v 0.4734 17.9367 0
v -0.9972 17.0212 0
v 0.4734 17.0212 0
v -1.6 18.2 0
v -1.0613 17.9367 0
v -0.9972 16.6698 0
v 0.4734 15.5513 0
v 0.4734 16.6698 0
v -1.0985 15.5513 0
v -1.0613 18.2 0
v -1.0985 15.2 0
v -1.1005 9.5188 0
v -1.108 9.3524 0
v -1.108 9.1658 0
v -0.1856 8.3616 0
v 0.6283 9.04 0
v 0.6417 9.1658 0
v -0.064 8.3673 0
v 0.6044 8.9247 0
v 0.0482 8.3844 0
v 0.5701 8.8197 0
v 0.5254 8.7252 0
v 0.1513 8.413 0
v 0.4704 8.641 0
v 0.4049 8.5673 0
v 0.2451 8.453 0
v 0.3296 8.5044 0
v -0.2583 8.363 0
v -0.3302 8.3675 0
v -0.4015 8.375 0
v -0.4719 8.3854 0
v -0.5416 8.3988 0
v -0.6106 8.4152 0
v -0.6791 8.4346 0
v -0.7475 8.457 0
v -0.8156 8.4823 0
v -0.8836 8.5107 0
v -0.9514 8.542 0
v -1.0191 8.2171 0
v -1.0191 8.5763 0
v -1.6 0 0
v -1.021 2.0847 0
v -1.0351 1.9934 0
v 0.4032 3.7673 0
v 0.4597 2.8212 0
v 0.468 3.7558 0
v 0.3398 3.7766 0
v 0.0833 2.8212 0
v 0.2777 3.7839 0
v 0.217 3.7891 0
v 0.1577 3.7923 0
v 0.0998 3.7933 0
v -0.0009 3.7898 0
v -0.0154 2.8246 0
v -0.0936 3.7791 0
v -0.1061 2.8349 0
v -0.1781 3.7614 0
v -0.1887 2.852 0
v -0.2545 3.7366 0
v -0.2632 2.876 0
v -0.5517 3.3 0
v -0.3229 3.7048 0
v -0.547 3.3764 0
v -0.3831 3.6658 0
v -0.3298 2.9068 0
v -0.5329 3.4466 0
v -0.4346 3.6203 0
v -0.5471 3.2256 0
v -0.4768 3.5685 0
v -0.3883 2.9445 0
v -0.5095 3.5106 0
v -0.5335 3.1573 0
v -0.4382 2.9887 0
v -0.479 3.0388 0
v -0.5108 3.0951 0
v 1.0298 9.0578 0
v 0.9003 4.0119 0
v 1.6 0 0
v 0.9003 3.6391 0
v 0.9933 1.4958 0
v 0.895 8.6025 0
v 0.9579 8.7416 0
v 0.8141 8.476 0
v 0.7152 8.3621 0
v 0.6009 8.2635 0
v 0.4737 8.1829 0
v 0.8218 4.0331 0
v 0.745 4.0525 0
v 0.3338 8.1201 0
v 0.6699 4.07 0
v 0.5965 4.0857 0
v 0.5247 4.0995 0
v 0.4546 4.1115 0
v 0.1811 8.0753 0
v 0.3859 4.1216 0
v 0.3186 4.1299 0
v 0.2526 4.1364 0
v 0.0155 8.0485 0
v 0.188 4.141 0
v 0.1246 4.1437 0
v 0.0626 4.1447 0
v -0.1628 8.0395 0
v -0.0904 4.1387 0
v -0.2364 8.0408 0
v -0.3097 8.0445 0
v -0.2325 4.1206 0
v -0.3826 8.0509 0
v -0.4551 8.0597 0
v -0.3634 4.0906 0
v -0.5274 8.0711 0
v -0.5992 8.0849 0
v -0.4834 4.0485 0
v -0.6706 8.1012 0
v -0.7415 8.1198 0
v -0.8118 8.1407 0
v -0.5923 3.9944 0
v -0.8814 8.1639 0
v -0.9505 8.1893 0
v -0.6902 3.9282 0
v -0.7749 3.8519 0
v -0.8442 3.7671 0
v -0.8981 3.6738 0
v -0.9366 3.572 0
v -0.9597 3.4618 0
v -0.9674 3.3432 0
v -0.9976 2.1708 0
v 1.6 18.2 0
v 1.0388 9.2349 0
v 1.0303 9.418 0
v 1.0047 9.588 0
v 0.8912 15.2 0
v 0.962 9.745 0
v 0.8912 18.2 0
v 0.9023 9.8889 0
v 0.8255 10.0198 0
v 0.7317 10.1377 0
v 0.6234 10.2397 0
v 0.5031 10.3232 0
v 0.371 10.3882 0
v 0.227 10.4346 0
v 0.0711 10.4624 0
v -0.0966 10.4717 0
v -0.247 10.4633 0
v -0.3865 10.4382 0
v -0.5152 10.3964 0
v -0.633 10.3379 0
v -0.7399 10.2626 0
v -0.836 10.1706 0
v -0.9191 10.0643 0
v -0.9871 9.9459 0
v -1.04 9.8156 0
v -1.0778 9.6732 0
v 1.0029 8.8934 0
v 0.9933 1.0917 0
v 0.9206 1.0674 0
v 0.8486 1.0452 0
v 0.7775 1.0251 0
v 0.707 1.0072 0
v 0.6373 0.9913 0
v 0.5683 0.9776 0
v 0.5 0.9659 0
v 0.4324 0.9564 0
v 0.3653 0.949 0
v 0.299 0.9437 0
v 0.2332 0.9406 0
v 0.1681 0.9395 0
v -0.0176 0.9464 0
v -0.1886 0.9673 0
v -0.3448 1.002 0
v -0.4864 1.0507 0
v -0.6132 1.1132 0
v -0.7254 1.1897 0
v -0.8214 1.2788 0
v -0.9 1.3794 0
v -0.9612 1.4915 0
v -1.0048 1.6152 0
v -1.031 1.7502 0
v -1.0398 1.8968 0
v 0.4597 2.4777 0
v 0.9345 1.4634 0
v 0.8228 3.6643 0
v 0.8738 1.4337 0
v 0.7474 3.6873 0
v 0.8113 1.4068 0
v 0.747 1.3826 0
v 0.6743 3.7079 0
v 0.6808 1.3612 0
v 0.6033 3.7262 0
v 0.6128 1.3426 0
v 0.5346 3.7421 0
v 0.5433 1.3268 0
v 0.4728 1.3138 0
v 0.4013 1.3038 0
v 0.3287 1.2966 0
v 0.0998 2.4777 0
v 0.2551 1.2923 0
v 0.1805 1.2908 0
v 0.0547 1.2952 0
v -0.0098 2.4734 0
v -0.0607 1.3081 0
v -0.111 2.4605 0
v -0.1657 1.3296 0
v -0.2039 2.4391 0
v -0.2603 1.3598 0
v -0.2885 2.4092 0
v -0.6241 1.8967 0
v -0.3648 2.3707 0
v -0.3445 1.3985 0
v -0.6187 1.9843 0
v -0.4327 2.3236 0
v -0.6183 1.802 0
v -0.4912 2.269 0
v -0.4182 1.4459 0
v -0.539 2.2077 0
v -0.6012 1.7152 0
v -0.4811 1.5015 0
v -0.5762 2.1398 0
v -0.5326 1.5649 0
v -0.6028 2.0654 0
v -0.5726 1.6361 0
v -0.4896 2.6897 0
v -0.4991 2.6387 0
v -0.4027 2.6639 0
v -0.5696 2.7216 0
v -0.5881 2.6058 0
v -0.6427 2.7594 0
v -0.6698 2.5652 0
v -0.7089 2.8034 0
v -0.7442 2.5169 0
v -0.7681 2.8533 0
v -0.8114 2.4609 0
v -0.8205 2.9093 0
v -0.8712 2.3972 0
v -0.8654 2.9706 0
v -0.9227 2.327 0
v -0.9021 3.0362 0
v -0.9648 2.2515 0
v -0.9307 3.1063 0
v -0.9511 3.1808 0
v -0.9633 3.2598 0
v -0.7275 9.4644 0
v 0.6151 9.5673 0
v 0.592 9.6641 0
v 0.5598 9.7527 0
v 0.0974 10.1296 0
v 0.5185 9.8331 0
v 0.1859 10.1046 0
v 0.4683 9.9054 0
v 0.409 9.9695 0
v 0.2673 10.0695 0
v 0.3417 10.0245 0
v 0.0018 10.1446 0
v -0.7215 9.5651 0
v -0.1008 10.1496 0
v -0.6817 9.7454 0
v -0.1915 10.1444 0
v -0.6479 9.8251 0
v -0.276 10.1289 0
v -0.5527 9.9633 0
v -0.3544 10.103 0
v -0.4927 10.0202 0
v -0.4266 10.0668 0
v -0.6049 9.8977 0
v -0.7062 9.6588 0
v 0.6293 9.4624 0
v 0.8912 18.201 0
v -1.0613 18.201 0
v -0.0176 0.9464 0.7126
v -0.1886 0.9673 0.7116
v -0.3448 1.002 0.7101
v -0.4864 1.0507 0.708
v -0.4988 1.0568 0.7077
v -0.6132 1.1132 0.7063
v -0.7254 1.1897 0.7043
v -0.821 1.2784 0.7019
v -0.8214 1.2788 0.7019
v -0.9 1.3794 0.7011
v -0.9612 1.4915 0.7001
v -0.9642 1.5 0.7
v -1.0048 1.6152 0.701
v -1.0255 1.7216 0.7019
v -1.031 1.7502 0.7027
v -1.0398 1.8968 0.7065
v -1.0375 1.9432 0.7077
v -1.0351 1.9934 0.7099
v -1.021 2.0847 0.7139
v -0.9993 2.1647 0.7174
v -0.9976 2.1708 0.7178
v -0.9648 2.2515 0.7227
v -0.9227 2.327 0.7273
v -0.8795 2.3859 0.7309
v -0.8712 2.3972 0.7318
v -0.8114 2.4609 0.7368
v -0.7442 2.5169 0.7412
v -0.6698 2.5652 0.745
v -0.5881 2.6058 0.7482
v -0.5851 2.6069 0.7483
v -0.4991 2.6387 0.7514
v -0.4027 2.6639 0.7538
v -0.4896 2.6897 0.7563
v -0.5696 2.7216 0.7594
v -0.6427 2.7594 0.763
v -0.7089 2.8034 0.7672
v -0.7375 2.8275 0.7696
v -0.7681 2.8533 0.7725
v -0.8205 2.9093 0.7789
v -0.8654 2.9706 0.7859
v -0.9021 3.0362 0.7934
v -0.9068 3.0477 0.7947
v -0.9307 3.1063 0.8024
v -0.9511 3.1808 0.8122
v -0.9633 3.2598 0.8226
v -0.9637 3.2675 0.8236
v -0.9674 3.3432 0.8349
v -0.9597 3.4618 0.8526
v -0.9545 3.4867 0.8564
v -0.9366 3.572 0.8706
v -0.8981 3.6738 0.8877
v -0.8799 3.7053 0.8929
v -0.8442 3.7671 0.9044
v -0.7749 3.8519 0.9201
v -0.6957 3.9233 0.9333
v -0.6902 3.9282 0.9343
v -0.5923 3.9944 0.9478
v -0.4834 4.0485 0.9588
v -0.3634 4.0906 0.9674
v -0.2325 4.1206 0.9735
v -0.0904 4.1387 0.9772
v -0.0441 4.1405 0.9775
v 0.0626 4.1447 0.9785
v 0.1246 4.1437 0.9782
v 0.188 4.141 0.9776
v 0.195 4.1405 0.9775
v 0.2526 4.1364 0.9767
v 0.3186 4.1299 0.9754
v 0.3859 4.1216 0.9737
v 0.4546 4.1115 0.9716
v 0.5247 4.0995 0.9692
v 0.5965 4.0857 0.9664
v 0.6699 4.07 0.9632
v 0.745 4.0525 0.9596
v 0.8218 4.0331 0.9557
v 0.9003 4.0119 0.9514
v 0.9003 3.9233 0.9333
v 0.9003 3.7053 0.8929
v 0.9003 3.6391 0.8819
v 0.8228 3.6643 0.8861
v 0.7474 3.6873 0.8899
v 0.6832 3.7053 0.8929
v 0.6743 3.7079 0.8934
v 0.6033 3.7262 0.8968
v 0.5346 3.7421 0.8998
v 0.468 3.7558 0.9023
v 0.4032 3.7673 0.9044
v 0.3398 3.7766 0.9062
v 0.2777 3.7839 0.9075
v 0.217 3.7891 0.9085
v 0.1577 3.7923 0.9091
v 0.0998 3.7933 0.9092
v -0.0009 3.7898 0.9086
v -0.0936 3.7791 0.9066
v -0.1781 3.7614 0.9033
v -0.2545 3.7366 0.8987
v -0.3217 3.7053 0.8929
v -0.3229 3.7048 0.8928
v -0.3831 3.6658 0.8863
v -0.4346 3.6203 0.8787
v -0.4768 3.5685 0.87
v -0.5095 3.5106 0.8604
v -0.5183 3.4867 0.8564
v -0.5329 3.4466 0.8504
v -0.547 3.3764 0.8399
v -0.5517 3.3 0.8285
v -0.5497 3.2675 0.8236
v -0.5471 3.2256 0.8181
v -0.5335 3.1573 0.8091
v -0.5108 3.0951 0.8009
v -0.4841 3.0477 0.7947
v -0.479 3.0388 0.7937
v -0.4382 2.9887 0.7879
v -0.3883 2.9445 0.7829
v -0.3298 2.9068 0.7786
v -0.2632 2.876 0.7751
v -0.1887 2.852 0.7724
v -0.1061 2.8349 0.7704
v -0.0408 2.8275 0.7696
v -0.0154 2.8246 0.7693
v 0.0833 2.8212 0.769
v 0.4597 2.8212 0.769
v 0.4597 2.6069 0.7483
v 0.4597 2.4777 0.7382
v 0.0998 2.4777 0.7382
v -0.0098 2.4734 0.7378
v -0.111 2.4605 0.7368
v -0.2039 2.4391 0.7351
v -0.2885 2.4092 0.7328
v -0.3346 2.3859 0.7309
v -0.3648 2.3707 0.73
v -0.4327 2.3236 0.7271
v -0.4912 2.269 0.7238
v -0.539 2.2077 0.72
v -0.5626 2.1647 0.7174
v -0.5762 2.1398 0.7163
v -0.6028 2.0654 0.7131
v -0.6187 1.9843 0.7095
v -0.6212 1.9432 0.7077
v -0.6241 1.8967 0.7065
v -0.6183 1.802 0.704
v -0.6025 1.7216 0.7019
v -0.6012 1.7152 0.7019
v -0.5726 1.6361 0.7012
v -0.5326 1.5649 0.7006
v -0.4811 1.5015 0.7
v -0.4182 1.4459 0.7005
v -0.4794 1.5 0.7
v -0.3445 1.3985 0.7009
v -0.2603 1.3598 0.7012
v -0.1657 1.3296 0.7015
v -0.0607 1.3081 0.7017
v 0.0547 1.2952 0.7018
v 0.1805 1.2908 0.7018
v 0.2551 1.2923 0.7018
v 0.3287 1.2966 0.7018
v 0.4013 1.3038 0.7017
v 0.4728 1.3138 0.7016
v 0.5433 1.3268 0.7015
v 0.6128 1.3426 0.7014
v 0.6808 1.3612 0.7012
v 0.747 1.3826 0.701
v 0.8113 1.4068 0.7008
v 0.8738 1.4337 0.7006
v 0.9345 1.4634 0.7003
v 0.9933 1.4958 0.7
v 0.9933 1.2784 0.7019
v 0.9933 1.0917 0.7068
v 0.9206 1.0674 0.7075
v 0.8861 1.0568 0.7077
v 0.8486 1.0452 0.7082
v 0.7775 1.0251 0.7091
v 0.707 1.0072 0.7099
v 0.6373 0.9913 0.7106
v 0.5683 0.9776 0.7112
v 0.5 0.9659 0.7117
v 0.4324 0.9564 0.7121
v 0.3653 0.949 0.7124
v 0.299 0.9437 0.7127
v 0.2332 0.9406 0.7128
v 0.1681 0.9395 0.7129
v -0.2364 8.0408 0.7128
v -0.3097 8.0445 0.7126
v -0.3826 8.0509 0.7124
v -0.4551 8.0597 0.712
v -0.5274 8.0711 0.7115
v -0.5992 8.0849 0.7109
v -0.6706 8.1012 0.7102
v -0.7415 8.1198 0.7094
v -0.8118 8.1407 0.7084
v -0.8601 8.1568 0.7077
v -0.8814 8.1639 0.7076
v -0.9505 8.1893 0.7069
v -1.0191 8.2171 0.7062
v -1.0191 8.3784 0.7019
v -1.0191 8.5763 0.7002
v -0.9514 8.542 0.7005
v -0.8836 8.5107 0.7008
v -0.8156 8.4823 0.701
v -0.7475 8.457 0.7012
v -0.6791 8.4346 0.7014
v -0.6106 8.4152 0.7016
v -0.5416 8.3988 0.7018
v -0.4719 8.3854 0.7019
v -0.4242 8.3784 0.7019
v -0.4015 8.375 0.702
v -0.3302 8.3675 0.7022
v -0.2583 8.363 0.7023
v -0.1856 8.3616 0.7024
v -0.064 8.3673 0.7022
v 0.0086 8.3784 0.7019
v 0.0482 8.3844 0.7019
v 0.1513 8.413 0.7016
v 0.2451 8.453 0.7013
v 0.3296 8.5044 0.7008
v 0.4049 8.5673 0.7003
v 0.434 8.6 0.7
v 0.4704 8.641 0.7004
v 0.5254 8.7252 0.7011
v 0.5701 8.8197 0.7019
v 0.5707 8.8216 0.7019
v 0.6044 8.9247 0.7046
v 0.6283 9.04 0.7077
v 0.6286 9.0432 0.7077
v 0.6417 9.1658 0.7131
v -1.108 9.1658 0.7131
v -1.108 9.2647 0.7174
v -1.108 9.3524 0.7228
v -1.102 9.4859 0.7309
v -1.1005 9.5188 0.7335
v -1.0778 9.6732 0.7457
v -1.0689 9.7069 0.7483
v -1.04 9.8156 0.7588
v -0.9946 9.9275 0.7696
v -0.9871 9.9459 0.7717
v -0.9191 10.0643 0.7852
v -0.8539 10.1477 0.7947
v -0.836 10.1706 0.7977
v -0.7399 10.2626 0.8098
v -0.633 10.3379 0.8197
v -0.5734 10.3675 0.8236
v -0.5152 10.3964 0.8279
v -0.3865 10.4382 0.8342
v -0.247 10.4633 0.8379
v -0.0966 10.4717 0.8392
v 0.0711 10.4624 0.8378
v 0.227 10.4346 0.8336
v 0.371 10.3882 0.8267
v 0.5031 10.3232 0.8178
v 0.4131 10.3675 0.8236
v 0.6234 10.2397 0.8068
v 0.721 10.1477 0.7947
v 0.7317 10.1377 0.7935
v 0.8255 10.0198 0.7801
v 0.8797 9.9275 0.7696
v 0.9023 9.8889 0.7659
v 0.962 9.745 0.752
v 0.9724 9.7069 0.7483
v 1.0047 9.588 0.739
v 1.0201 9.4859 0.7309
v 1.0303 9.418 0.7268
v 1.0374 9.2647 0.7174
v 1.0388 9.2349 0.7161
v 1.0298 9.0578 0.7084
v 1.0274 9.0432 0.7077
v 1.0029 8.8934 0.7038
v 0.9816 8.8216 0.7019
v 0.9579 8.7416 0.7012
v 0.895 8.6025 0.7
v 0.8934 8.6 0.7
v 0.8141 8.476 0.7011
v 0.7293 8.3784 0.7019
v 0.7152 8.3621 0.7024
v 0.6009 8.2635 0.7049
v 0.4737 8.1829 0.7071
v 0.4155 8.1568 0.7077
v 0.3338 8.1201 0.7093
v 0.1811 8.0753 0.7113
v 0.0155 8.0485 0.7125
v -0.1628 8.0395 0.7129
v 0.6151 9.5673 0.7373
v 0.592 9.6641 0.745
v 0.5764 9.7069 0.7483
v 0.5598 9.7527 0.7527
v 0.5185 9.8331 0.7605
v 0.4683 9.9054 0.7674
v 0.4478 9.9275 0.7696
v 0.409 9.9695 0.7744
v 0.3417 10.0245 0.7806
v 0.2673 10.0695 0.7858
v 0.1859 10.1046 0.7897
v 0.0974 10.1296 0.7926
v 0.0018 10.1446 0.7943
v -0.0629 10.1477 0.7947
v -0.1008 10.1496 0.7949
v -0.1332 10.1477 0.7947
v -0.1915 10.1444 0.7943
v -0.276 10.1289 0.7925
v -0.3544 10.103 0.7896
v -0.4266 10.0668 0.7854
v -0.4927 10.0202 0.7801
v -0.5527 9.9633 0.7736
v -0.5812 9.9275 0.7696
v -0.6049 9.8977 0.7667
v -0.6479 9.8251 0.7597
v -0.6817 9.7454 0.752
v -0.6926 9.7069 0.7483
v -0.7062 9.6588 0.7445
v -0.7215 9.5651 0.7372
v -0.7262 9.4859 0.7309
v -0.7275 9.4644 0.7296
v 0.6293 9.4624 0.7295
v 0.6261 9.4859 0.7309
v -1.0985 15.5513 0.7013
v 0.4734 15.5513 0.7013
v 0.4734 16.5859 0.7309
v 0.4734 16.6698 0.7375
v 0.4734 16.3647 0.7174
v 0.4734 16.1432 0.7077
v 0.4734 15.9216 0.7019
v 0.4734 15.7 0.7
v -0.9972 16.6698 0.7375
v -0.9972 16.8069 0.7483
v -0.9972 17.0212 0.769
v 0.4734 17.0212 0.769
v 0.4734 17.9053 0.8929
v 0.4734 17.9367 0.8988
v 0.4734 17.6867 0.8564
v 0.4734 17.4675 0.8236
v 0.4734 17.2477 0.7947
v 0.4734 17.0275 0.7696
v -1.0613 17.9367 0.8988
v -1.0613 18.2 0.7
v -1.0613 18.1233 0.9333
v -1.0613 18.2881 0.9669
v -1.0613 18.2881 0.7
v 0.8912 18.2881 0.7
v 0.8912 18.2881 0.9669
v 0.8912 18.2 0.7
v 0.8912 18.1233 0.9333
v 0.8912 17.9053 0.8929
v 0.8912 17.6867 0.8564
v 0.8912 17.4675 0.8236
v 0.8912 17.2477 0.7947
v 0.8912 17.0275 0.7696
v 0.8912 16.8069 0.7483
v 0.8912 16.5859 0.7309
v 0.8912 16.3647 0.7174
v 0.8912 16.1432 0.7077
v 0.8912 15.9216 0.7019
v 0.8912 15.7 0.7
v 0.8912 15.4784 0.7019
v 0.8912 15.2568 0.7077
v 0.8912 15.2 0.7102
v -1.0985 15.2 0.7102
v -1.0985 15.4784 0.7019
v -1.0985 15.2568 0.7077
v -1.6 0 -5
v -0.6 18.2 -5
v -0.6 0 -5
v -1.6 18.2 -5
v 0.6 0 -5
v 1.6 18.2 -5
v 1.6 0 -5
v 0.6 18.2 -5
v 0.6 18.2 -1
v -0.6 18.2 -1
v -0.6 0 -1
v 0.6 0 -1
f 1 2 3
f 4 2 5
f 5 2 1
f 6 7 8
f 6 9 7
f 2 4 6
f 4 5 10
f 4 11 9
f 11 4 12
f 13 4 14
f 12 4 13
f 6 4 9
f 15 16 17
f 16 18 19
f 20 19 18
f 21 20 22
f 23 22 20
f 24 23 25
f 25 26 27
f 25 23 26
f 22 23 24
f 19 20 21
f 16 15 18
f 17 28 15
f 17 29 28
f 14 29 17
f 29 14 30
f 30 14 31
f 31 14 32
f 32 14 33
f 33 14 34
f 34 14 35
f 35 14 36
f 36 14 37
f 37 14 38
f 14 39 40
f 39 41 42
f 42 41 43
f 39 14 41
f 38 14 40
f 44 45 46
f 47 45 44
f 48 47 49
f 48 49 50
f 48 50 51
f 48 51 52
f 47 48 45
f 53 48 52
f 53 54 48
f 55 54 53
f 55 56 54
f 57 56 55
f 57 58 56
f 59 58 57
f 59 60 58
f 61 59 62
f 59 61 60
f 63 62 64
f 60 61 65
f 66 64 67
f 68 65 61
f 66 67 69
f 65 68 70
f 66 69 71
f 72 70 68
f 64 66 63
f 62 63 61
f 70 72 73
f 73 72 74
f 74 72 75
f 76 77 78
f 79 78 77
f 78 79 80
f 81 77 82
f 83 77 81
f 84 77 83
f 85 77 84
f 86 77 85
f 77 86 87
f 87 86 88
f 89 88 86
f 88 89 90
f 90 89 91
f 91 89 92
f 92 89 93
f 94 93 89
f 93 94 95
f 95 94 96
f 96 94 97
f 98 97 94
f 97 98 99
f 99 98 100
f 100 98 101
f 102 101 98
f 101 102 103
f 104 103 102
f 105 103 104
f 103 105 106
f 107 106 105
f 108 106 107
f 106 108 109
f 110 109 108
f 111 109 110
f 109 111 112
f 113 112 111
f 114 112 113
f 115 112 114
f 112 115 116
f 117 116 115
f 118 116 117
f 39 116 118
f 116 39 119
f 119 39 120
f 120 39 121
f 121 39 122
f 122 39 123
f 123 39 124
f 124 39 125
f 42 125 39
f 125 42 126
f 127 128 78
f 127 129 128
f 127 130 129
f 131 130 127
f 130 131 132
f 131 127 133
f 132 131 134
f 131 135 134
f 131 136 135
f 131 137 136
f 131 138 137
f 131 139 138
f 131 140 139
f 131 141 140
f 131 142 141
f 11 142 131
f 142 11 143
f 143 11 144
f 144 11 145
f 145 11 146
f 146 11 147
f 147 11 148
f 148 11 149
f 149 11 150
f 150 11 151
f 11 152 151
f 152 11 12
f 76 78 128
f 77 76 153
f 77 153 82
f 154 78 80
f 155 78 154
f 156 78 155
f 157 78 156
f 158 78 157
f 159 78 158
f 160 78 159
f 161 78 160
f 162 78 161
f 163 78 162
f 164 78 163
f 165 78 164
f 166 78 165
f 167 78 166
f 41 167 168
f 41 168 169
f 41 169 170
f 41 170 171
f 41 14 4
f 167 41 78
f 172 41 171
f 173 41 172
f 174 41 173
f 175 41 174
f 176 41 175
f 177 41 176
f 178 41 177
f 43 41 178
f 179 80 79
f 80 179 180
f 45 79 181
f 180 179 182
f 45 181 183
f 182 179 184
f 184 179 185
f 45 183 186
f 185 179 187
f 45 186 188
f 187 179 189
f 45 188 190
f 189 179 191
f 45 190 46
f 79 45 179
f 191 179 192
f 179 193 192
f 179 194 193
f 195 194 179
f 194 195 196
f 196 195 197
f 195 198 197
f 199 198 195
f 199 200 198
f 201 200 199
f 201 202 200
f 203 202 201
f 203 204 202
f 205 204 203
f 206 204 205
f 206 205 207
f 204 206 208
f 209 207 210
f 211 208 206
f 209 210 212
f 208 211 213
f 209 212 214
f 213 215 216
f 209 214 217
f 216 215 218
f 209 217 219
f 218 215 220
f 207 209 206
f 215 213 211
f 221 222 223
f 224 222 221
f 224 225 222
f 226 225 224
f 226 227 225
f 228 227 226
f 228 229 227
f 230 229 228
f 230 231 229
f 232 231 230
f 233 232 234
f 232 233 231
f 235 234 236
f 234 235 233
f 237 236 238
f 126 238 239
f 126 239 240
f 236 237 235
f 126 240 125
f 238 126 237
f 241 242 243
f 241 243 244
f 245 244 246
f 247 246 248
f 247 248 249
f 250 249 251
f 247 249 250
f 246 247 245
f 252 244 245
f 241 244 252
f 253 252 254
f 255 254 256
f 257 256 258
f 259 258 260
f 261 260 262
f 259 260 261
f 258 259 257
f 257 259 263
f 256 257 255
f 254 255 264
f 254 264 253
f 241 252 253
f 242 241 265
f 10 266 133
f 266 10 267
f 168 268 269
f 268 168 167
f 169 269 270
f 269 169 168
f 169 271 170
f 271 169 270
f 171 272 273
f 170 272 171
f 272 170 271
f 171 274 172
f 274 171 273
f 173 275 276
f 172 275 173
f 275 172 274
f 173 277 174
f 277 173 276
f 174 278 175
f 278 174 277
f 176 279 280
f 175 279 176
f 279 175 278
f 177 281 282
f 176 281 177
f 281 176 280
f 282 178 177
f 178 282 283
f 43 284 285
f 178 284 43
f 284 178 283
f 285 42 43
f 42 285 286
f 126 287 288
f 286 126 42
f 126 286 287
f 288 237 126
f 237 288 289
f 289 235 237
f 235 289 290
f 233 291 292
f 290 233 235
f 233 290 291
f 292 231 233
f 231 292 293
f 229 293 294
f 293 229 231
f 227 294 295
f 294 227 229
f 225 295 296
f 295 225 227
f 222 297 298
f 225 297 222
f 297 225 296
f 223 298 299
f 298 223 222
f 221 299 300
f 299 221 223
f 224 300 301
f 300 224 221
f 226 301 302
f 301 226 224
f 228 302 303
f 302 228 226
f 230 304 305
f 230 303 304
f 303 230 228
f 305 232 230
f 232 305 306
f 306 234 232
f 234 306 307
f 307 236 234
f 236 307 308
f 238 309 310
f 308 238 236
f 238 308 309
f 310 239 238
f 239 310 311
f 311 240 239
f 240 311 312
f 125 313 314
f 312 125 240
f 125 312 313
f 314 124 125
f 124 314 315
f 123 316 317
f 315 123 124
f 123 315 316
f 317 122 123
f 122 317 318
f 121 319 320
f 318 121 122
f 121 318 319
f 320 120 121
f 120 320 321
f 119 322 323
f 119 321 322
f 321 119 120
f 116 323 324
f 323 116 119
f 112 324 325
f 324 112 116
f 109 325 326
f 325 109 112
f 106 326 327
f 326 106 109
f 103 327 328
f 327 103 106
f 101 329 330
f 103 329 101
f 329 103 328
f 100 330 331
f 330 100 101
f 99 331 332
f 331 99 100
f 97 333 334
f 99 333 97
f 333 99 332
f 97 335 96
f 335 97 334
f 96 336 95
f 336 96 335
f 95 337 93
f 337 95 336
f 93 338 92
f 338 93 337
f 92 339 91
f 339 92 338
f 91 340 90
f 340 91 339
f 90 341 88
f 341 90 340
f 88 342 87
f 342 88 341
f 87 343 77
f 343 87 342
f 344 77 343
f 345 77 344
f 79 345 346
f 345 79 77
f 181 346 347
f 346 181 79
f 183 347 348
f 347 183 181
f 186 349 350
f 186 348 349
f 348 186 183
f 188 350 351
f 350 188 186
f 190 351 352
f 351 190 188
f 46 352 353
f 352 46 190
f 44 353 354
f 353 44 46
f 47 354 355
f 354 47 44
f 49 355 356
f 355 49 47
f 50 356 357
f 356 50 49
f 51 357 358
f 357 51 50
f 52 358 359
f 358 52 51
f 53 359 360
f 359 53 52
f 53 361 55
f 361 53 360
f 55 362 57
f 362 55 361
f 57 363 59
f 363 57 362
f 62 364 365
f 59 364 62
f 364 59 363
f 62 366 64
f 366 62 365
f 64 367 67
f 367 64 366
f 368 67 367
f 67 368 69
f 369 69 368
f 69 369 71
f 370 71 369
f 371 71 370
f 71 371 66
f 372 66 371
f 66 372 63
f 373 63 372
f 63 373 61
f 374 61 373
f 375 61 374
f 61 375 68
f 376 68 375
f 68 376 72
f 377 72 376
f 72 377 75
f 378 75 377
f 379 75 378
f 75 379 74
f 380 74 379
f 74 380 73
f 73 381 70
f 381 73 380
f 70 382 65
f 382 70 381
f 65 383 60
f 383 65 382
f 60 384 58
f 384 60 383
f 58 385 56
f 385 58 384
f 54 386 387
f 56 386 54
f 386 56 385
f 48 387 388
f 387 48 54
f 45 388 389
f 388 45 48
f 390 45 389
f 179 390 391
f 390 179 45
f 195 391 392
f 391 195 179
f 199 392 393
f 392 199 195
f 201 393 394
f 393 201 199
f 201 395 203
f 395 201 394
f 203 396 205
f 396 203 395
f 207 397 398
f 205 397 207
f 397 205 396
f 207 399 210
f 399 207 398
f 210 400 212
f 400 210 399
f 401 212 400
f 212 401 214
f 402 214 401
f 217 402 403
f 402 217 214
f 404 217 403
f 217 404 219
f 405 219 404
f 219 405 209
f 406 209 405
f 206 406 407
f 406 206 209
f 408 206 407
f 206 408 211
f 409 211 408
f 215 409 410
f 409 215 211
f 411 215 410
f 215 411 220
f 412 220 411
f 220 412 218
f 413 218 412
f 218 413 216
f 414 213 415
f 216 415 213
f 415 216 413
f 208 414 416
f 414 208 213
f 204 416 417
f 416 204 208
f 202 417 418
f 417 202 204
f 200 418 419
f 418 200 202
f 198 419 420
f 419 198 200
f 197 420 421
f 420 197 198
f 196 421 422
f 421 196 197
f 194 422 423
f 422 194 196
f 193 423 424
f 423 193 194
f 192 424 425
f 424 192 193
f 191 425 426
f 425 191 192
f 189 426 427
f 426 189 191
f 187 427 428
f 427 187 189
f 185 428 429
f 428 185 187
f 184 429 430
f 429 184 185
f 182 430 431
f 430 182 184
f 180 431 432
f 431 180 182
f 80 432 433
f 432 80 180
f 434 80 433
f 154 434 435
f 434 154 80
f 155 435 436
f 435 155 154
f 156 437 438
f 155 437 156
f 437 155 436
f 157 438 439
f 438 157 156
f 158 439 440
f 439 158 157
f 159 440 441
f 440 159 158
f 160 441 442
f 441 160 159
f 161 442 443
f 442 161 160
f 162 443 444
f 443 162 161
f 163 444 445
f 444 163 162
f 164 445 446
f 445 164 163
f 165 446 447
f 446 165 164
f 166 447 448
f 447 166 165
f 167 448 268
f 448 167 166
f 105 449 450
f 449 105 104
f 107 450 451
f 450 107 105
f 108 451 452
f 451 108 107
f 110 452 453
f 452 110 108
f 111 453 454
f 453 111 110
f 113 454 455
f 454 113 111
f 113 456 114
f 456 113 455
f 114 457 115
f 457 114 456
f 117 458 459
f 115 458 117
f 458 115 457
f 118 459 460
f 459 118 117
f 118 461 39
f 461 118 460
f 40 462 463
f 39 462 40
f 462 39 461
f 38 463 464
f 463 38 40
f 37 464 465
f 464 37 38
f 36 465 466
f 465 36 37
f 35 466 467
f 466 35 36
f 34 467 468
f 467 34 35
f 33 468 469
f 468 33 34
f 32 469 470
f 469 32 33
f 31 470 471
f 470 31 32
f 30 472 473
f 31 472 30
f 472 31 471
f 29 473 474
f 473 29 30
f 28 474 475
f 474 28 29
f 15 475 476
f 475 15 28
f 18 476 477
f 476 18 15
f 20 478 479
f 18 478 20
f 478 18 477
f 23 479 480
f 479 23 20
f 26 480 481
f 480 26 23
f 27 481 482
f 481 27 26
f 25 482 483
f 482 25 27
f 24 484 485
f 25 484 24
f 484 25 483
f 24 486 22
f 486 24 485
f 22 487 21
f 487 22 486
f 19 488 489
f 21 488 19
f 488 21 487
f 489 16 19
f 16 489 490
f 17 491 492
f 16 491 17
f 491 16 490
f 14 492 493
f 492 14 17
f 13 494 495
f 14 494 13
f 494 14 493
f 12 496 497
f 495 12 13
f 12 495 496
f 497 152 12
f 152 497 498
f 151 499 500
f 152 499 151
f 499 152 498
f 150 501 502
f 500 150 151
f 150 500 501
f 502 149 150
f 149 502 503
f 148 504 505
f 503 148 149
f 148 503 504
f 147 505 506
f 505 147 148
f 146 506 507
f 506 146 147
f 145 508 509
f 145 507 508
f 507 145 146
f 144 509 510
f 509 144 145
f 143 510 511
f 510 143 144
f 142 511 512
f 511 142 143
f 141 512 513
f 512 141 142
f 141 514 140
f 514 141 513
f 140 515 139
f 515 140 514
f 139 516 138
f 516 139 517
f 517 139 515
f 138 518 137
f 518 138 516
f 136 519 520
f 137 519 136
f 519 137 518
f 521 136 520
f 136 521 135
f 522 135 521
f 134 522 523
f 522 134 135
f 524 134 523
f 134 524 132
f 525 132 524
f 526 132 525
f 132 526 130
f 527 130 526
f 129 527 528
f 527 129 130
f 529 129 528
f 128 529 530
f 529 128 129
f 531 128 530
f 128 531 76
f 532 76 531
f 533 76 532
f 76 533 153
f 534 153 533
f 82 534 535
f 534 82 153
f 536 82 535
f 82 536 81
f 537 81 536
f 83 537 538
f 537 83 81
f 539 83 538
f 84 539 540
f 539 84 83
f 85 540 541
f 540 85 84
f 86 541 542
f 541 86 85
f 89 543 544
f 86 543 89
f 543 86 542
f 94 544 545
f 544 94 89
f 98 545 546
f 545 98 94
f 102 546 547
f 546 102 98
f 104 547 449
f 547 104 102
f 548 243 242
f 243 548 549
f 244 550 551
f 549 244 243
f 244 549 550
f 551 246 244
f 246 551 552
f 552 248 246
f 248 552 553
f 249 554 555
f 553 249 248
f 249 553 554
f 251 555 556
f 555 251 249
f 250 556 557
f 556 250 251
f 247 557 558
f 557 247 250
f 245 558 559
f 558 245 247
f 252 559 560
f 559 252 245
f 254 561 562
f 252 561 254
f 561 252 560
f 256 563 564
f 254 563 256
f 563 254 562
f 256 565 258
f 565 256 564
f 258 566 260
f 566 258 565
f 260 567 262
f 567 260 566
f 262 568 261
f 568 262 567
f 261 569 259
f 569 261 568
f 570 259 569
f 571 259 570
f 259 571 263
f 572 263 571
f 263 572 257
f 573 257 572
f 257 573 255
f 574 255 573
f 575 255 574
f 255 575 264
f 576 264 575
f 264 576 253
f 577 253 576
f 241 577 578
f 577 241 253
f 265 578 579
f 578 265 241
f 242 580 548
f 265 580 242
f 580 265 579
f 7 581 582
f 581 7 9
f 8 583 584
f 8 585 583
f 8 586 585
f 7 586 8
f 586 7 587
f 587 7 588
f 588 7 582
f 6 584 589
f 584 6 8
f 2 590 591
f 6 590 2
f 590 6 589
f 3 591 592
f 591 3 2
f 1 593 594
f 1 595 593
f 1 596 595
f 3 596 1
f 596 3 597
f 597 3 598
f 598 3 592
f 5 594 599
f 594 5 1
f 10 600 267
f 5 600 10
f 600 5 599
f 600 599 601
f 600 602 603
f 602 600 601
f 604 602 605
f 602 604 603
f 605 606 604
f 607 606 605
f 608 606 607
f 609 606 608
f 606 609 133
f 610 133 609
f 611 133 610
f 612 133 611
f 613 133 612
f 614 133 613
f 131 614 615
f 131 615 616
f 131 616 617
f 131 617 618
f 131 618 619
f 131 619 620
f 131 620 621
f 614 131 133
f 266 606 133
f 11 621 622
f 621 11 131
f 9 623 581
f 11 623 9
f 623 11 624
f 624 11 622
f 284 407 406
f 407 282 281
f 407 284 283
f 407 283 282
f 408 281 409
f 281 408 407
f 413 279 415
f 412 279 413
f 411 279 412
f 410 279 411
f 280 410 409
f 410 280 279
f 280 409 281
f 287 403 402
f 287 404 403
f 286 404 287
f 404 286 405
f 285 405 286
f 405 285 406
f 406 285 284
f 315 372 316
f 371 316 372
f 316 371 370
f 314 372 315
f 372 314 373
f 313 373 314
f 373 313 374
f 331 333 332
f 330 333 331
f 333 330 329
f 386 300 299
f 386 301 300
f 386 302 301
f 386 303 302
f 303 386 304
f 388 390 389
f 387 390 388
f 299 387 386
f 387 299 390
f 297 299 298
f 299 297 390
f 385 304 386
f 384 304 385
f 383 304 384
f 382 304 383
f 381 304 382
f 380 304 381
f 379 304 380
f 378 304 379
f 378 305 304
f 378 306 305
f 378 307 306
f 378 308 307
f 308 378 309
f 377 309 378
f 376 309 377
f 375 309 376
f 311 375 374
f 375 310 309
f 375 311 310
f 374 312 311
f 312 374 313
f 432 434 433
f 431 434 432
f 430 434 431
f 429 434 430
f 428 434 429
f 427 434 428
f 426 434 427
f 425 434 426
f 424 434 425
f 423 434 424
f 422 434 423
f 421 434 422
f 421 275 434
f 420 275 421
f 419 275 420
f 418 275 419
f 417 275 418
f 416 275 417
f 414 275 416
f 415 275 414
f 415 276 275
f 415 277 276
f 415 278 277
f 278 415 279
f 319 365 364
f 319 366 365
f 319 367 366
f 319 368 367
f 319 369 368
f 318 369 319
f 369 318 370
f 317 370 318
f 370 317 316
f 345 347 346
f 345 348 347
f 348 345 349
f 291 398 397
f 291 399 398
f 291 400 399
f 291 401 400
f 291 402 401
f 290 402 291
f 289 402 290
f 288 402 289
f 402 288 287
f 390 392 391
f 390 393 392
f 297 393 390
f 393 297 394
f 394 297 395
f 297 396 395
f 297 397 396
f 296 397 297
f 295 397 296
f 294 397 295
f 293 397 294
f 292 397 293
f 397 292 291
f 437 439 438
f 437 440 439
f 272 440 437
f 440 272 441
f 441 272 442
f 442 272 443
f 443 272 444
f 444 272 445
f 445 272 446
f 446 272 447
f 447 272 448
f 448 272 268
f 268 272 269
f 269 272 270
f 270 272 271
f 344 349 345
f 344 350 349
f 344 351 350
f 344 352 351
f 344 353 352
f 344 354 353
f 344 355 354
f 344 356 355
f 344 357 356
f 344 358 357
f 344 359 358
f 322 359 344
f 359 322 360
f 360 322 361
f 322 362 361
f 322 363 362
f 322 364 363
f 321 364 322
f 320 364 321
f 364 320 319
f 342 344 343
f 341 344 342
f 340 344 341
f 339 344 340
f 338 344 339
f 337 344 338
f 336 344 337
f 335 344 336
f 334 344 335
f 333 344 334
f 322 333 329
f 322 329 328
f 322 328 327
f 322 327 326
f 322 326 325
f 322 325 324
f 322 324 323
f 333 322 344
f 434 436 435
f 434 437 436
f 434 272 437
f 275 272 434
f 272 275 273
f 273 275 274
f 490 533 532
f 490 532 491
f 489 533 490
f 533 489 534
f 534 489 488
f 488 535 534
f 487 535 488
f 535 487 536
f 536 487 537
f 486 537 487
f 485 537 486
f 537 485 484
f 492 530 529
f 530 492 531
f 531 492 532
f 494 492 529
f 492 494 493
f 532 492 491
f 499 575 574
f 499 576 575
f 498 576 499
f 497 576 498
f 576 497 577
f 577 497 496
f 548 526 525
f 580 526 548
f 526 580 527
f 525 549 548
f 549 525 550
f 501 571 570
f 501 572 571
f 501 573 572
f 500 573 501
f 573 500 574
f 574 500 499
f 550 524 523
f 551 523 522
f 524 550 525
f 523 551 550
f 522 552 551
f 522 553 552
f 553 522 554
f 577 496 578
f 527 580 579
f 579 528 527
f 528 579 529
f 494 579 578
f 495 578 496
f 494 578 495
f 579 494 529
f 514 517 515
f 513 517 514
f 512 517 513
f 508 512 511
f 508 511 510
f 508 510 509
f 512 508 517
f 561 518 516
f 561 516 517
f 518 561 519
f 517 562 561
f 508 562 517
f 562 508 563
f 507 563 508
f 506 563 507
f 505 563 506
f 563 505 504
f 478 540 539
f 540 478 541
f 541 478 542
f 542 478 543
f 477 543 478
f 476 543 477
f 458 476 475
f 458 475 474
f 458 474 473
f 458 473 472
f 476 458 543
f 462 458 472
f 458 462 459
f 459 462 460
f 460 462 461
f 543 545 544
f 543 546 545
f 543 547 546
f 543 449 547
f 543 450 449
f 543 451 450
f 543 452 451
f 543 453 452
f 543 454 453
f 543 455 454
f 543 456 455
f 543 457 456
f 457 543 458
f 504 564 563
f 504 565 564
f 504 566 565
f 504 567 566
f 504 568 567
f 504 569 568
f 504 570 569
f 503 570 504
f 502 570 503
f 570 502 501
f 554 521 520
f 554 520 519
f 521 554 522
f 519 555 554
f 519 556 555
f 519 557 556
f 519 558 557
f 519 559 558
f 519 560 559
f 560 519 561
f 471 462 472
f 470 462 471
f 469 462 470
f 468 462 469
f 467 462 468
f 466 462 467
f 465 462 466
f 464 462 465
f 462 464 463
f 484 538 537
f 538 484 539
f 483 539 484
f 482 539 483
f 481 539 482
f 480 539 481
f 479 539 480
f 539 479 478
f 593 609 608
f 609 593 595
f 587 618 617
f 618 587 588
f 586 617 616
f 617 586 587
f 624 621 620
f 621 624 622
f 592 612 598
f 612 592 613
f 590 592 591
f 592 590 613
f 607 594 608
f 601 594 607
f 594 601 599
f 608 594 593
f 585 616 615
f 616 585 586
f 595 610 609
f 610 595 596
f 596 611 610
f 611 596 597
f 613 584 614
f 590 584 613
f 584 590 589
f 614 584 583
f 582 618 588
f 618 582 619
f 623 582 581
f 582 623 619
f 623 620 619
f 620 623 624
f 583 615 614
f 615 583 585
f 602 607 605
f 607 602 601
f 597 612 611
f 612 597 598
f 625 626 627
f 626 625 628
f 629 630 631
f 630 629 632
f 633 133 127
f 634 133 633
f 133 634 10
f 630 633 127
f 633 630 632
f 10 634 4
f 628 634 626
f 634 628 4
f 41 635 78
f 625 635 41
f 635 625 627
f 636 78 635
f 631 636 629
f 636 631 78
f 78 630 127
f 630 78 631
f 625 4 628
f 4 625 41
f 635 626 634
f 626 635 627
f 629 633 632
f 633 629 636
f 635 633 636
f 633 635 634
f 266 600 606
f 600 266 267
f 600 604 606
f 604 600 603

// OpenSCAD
//Type Slug
//Leonard Chau
//October 5, 2023
$fn=40;
Body_Width=3.2;//B
Body_Length=18.2;//A
Body_Height=5;//C
Platen_Shift_Motion=7.1;//P
Baselines_Shift_Motion=7.1;//O
Body_Slot_Width=1.2;//D
Wing_Thickness=(Body_Width-Body_Slot_Width)/2; // .5;//G
Aligning_Cut=1.5;//Bottom of slug to lowercase cut
Baseline=1;//Bottom of slug to lowercase
Platen_Diameter=25.4;//R
Bottom_Thickness=1;//F
Draft_Angle=60;//alpha
r=sin(Draft_Angle);
Engraving_Depth=.7;//E
Upper_Wing_Angle=0;// 12;//gamma
Lower_Wing_Angle=0;// 10;//roh

Lower_Char="e";
Upper_Char="E";
Figure_Char="3";
Type_Size=3.05;
Typeface="Erica Type";
Debug_No_Minkowski=true;

difference(){
    union(){
//Create Solid Type Body
        translate([-Body_Width/2, 0, -Body_Height])
        cube([Body_Width, Body_Length, Body_Height]);
        
//Create Draft Angle Text
        minkowski(){
        difference(){
            translate([0, Baseline, 0])
            mirror([1, 0, 0]){
            linear_extrude(2)
            text(text=Figure_Char, font=Typeface, size=Type_Size, halign="center", valign="baseline");
            linear_extrude(2)
            translate([0, Baselines_Shift_Motion, 0])
            text(text=Lower_Char, font=Typeface, size=Type_Size, halign="center", valign="baseline");
            linear_extrude(2)
            translate([0, 2*Baselines_Shift_Motion, 0])
            text(text=Upper_Char, font=Typeface, size=Type_Size, halign="center", valign="baseline");
            }
            
//Platen Cutout
            translate([0,Aligning_Cut, Engraving_Depth+Platen_Diameter/2])
            rotate([0, 90, 0]){
                cylinder(h=Body_Width, d=Platen_Diameter, center=true, $fn=360);
                translate([0,Platen_Shift_Motion,0])
                cylinder(h=Body_Width, d=Platen_Diameter, center=true, $fn=360);
                translate([0,2*Platen_Shift_Motion,0])
                cylinder(h=Body_Width, d=Platen_Diameter, center=true, $fn=360);
            }
        }
        
    //Draft Angle Shape
	if (Debug_No_Minkowski!=true)
        translate([0,0,-Engraving_Depth*1.5])
        cylinder(h=Engraving_Depth*1.5, r1=r*Engraving_Depth*1.5, r2=0);
        }
    }

    rotate([-90, 0, 0]){
        
//Cut Typebar Slot
        translate([-Body_Slot_Width/2, Bottom_Thickness, -.001])
        linear_extrude(Body_Length+.002)
        square([Body_Slot_Width, 10]);

//Cut Wing Tapers
        translate([0, 0, -.001]){
            linear_extrude(Body_Length+.002)
            #polygon([[Body_Width/2, 0], [Body_Width/2, -Engraving_Depth], [Body_Width/2+1, -Engraving_Depth], [Body_Width/2+1, Body_Height], [Body_Slot_Width/2+Wing_Thickness, Body_Height]]);
            mirror([1, 0, 0])
            linear_extrude(Body_Length+.002)
            #polygon([[Body_Width/2, 0], [Body_Width/2, -Engraving_Depth], [Body_Width/2+1, -Engraving_Depth], [Body_Width/2+1, Body_Height], [Body_Slot_Width/2+Wing_Thickness, Body_Height]]);
        }
    }
    
//Cut Upper Wing Angle
translate([5, Body_Length, 0])
rotate([90, 0, -90])
linear_extrude(10)
polygon([[-.001, 0], [Body_Height*1.5*sin(Upper_Wing_Angle), -Body_Height*1.5*cos(Upper_Wing_Angle)], [-Engraving_Depth, -Body_Height*1.5], [-Engraving_Depth, Engraving_Depth], [0, Engraving_Depth]]);

//Cut Lower Wing Angle
translate([-5, 0, 0])
rotate([90, 0, 90])
linear_extrude(10)
polygon([[-.001, 0], [Body_Height*1.5*sin(Upper_Wing_Angle), -Body_Height*1.5*cos(Upper_Wing_Angle)], [-Engraving_Depth, -Body_Height*1.5], [-Engraving_Depth, Engraving_Depth], [0, Engraving_Depth]]);


}
